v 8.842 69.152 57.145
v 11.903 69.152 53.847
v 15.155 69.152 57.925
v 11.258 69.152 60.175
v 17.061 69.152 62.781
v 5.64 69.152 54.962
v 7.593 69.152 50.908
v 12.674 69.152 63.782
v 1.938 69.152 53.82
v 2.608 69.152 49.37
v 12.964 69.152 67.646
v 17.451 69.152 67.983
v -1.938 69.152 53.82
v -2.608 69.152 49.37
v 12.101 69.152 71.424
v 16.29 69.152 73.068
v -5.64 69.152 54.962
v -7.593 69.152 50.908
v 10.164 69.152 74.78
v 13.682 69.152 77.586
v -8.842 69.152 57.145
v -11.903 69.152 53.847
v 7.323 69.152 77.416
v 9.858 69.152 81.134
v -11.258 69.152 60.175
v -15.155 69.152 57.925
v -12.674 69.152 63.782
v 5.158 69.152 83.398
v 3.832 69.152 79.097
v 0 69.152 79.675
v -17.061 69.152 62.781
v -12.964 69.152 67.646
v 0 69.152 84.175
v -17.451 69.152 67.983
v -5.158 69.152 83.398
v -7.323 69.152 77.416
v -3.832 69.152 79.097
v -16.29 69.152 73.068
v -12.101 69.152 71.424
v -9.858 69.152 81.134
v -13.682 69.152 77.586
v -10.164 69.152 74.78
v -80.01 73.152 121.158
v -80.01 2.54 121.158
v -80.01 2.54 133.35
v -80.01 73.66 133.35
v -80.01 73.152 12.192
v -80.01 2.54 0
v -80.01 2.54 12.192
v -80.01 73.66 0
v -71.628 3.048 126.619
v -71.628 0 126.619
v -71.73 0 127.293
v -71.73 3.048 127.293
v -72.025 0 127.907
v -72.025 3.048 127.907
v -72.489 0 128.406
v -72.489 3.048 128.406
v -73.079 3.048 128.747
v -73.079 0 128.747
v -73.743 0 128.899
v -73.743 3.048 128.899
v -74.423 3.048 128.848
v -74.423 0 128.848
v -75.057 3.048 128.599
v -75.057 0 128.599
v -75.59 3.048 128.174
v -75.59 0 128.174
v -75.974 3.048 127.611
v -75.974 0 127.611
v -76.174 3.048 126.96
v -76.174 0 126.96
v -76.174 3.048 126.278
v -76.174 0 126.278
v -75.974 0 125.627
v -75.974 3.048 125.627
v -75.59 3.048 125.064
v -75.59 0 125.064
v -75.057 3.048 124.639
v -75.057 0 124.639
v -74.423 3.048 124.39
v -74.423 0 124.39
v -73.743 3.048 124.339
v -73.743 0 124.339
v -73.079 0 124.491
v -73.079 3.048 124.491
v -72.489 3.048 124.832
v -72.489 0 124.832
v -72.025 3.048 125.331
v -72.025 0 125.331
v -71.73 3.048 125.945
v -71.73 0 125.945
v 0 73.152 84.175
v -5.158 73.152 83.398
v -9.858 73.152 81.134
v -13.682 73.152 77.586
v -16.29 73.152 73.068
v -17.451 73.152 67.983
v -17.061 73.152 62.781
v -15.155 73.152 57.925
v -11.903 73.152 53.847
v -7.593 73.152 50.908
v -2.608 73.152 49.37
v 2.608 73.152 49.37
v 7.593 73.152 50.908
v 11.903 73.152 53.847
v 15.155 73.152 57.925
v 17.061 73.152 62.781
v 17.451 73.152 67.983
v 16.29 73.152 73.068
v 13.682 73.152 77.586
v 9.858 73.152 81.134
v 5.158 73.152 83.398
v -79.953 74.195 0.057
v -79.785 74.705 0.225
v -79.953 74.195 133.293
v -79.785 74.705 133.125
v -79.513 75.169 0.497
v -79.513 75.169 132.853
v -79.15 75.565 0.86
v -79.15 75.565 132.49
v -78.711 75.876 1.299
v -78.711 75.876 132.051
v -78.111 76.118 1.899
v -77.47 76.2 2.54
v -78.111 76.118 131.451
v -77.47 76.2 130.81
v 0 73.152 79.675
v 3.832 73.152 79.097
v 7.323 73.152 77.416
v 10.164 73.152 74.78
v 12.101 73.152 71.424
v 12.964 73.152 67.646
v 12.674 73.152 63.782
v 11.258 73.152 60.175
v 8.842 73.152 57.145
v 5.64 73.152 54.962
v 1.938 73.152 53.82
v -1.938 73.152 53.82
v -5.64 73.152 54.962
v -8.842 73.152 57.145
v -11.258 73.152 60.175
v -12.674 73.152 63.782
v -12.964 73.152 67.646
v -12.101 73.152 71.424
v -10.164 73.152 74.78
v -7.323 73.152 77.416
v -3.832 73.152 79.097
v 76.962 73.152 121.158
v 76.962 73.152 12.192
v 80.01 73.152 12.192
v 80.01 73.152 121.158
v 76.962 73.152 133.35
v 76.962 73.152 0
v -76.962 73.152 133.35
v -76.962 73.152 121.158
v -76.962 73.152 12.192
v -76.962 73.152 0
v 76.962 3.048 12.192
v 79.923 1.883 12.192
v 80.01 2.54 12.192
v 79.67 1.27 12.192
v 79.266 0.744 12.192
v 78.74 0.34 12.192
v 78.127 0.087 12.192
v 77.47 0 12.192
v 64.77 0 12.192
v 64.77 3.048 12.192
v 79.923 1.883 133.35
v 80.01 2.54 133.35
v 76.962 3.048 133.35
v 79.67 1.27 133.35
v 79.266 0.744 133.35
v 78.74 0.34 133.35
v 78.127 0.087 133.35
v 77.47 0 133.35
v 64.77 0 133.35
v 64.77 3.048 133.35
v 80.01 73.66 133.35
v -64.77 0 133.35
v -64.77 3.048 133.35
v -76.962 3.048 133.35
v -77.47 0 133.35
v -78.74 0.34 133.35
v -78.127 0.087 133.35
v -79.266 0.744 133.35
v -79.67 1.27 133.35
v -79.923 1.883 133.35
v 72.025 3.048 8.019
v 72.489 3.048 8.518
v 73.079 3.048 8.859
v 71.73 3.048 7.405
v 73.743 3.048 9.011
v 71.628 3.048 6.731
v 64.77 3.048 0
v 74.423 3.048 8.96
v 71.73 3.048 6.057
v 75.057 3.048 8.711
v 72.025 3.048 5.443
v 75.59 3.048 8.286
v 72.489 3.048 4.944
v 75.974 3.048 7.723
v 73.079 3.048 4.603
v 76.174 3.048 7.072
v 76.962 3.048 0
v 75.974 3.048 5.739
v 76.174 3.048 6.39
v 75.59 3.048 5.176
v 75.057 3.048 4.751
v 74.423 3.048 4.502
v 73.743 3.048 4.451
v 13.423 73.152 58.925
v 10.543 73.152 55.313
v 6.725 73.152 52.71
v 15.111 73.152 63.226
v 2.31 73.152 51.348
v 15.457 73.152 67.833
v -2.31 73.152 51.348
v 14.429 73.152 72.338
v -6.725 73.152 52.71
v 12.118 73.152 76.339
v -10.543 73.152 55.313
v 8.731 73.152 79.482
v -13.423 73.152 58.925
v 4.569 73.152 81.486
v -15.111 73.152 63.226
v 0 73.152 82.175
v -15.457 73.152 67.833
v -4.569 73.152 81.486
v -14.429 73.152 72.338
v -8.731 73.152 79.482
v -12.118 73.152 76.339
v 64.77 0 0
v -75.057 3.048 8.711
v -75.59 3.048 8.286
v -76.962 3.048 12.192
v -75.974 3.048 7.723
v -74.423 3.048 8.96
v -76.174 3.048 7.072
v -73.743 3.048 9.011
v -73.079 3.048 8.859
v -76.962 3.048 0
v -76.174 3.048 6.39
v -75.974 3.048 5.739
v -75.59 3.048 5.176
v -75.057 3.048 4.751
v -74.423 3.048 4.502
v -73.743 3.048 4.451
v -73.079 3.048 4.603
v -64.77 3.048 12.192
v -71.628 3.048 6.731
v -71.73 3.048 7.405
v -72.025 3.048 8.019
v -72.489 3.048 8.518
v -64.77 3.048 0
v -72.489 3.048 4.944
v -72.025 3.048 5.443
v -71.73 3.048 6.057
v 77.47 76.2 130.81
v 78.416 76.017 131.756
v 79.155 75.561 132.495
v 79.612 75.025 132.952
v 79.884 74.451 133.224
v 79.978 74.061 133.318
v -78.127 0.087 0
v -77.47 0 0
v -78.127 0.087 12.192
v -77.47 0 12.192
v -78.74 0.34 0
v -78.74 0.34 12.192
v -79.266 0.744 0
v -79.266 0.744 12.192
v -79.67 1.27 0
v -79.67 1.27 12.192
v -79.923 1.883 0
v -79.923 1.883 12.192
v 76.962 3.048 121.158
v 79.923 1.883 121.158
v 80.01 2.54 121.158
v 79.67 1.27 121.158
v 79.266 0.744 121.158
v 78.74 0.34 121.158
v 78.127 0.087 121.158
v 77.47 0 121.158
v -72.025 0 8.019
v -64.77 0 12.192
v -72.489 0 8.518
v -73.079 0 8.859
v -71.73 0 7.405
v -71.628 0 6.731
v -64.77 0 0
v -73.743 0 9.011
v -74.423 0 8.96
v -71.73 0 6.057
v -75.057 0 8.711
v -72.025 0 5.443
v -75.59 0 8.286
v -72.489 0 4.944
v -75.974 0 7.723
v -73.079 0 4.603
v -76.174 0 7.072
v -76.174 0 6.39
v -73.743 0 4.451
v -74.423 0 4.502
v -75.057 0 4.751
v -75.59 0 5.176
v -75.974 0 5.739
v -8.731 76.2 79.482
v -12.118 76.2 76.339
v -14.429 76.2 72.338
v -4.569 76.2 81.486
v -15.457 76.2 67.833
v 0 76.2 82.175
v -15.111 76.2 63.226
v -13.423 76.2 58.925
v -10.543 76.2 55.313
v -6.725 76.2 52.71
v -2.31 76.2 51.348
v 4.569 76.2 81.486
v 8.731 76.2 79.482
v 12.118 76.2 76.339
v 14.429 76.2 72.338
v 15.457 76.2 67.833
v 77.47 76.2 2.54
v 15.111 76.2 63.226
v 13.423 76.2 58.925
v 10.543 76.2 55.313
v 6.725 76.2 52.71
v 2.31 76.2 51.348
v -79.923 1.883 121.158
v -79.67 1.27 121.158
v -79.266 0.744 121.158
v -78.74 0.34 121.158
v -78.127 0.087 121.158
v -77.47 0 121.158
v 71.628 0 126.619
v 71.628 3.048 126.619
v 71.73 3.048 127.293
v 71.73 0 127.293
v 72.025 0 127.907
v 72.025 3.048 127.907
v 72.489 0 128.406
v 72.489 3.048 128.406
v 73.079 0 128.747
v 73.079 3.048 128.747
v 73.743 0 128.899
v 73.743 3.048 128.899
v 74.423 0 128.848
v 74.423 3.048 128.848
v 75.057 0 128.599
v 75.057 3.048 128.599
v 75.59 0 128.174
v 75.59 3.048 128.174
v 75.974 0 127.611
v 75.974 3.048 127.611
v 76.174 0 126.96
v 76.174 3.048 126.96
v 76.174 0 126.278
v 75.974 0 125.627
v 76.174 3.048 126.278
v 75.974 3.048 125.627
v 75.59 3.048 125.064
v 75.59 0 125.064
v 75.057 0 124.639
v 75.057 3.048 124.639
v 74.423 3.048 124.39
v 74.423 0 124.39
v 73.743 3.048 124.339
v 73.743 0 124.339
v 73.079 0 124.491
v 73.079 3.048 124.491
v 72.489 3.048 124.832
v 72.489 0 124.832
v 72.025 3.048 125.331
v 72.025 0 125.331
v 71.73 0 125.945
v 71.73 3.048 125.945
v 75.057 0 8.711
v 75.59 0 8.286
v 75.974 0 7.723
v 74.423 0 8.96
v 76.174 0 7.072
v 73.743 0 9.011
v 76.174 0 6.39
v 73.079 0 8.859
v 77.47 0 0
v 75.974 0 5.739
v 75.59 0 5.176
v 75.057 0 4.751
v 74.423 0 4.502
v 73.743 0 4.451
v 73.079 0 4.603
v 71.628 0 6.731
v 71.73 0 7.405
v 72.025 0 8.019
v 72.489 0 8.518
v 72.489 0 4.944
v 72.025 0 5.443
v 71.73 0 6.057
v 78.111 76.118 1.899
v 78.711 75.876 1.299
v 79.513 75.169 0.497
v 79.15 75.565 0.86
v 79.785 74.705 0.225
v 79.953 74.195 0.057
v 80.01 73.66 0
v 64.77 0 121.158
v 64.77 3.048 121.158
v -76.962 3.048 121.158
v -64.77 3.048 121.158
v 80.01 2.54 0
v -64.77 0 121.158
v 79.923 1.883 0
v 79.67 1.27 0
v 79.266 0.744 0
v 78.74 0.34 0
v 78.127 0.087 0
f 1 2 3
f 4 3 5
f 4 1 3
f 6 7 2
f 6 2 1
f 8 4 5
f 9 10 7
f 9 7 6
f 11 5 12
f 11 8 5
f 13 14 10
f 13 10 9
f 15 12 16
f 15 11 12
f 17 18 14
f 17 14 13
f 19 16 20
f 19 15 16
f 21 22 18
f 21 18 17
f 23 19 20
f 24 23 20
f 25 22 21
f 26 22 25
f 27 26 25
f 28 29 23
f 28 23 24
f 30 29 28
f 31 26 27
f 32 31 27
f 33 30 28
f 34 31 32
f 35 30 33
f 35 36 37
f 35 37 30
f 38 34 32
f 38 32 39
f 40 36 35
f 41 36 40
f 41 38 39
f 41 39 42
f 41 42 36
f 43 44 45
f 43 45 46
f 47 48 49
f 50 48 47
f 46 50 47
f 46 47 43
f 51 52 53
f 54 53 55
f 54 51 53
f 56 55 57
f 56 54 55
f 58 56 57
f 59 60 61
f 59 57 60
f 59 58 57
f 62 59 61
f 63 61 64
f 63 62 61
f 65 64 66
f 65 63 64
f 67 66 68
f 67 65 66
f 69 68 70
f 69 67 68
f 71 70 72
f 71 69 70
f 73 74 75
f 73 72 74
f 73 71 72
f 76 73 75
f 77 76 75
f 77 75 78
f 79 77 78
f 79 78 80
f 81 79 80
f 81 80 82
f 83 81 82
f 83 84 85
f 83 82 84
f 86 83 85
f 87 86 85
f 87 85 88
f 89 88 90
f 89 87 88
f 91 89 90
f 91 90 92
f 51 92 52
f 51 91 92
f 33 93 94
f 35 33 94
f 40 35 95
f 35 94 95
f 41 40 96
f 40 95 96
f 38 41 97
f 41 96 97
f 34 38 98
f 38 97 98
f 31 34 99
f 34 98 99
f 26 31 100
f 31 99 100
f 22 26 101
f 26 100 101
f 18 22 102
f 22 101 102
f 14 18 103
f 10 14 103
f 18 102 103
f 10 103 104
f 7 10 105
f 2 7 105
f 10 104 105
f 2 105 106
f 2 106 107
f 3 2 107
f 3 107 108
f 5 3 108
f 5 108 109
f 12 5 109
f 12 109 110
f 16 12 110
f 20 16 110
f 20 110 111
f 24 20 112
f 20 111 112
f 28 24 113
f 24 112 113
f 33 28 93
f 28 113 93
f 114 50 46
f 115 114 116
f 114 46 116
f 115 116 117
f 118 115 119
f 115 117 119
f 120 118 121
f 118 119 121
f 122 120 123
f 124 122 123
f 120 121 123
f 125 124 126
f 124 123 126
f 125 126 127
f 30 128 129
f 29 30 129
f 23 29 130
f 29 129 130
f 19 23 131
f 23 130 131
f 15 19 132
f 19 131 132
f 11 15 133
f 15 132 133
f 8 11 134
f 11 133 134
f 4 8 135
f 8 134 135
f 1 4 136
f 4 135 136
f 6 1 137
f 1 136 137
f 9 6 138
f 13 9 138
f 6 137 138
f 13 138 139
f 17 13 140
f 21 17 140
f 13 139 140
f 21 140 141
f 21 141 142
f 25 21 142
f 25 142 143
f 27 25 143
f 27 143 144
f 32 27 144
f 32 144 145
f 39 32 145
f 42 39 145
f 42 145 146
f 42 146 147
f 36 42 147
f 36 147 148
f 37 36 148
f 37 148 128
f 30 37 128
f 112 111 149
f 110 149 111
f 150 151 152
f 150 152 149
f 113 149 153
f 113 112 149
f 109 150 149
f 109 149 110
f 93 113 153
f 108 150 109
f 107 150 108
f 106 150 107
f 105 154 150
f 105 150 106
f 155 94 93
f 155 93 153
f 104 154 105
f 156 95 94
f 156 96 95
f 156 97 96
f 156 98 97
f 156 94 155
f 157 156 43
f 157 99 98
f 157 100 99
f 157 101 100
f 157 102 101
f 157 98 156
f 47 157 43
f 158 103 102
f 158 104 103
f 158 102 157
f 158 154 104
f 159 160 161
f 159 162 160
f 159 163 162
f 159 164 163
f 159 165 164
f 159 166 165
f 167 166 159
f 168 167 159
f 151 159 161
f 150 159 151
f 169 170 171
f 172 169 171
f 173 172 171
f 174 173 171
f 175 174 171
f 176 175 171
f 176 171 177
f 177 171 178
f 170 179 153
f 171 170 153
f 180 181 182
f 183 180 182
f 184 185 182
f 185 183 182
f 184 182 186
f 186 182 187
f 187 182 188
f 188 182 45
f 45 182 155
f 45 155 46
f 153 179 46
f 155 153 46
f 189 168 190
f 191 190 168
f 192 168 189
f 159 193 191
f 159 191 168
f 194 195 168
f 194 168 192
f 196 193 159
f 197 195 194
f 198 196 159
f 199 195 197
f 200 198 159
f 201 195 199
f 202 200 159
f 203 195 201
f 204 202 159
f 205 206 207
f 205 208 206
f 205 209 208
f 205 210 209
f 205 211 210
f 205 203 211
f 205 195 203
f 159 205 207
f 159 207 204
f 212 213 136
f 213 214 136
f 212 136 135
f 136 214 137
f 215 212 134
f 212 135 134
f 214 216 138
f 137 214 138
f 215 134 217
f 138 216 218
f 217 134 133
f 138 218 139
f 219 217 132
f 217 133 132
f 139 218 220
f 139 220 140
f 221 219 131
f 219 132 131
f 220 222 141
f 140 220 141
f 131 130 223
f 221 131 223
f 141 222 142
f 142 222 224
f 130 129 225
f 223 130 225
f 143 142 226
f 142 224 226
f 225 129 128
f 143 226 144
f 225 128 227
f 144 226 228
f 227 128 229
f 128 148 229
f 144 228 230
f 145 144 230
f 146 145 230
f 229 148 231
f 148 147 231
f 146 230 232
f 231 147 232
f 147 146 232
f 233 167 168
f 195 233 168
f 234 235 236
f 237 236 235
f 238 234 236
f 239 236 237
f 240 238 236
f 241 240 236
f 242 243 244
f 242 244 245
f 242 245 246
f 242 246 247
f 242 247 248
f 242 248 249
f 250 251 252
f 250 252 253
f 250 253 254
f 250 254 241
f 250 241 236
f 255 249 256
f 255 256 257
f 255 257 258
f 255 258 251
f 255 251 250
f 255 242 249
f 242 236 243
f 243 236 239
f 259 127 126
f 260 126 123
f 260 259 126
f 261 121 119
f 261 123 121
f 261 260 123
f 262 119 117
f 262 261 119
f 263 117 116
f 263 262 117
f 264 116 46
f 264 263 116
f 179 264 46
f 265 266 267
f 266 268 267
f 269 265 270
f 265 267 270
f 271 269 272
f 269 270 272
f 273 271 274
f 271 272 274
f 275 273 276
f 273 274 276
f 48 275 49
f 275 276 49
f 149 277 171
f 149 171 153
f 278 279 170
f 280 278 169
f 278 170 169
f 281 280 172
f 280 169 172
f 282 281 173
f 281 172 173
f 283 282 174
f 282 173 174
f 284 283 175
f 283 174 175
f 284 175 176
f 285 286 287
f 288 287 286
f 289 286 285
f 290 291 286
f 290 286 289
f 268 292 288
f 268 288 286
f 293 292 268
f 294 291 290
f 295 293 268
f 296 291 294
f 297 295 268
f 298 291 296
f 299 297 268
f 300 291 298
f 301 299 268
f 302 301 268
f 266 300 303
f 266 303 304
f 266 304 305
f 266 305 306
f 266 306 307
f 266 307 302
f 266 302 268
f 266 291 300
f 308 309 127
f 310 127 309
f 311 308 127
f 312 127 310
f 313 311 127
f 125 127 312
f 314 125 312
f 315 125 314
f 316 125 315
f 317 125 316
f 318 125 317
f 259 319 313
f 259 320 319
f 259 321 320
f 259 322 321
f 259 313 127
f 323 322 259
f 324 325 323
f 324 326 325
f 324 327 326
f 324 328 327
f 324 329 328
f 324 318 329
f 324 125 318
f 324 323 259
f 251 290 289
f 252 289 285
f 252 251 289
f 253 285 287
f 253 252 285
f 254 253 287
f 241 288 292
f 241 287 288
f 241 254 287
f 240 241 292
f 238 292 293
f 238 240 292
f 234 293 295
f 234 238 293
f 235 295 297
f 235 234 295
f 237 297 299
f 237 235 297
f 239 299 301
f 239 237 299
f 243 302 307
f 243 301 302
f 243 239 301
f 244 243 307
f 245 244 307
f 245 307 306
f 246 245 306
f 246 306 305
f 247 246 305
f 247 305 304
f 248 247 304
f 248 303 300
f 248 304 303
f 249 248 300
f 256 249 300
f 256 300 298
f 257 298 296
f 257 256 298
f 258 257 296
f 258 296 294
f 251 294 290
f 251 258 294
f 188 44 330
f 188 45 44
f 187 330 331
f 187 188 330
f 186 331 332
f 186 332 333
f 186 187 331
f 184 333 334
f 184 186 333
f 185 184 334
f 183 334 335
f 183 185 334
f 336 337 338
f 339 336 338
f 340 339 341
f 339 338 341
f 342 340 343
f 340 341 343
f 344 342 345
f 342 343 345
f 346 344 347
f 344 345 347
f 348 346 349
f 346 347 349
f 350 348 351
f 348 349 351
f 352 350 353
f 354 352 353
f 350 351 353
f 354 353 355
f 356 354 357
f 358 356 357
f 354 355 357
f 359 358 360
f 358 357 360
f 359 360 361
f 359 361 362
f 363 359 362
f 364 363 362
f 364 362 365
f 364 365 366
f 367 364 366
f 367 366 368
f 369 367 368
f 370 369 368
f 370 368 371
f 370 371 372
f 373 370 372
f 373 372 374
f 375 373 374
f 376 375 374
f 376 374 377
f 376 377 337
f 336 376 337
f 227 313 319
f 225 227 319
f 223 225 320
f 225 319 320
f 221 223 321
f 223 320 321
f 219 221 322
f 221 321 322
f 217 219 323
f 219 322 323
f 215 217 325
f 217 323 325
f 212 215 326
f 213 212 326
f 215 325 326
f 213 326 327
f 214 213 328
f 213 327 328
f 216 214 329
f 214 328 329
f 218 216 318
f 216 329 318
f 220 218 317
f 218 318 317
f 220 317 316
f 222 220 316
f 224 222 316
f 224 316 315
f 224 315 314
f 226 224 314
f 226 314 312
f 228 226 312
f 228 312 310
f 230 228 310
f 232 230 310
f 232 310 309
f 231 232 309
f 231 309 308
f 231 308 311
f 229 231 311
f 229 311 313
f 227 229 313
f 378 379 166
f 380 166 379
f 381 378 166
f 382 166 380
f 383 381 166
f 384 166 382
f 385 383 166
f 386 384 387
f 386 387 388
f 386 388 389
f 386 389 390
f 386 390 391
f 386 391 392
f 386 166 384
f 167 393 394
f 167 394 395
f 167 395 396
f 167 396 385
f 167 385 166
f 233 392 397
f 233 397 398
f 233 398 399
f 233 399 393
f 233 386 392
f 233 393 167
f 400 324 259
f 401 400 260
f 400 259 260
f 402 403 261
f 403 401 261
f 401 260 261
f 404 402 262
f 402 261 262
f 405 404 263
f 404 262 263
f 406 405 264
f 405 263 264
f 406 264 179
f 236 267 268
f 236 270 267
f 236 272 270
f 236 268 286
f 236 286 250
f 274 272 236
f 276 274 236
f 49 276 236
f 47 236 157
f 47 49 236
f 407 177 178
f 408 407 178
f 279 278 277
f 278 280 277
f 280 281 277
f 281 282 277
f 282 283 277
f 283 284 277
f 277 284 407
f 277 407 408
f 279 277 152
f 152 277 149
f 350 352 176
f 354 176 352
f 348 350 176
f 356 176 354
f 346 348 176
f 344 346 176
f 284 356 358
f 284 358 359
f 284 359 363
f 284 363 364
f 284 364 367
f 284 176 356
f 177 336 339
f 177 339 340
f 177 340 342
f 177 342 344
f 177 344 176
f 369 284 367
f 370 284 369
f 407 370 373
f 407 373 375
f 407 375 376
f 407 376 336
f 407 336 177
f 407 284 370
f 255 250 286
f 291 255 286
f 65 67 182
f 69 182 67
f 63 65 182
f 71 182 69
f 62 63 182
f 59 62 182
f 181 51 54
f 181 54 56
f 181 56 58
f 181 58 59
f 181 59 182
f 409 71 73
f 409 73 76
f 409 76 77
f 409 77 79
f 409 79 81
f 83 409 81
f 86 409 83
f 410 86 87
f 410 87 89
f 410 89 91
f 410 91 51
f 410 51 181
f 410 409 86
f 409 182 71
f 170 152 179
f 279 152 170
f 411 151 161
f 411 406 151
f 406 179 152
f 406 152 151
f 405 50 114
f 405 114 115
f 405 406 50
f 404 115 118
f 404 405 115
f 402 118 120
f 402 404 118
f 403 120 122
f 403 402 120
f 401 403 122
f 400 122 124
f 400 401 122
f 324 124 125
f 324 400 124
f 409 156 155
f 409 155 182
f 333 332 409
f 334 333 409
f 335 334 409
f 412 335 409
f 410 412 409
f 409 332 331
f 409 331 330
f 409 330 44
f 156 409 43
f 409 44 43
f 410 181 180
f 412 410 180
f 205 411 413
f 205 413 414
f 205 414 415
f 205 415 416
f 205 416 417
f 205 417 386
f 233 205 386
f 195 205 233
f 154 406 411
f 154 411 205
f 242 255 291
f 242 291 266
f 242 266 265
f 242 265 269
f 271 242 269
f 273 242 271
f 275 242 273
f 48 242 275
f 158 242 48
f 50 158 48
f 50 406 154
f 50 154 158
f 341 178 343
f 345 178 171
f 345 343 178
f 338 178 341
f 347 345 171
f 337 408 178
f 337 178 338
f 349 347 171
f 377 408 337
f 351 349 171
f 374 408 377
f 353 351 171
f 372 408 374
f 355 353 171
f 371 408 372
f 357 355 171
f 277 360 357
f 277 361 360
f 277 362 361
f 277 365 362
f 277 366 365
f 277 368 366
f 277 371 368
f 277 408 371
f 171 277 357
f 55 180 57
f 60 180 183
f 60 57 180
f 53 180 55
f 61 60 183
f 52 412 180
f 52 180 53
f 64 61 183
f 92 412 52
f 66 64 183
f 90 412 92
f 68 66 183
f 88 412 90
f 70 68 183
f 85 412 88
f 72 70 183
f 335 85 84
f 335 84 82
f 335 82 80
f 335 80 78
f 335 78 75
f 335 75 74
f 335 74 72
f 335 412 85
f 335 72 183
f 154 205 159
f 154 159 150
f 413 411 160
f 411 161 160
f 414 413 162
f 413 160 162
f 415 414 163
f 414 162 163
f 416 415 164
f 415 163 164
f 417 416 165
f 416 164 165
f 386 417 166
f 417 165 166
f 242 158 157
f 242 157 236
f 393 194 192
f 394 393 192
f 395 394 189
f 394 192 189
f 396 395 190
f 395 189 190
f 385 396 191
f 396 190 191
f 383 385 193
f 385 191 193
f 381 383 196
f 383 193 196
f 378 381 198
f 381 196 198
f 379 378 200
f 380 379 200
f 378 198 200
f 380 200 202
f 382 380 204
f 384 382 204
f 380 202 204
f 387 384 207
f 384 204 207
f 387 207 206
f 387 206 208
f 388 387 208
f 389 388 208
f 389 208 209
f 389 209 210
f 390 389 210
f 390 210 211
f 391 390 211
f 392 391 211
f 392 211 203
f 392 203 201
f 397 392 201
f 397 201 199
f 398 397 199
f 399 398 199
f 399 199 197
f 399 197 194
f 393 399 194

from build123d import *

# Parameters (mm, degrees)
BOSS_EXTRU_1_DEPTH      = 133.35
ESQUISSE3_W             = 108.966
ESQUISSE3_H             = 73.152
ENL_V_MAT_EXTRU_1_DEPTH = 222.799600766
ESQUISSE4_R             = 2.286
ENL_V_MAT_EXTRU_2_DEPTH = 172.857608804
CONG_1_R                = 2.54
CONG_2_R                = 2.54
ESQUISSE5_R             = 2.286
ENL_V_MAT_EXTRU_3_DEPTH = 172.857608804
ESQUISSE6_R             = 15.5
ENL_V_MAT_EXTRU_4_DEPTH = 174.176969023
SKETCH1_R               = 17.5
BOSS_EXTRUDE1_DEPTH     = 4
SKETCH2_R               = 13
CUT_EXTRUDE1_DEPTH      = 172.857608804


with BuildPart() as part:
    # Esquisse2 → Boss.-Extru.1 (new body)
    with BuildSketch(Plane.XY):
        Polygon((-64.77, 0), (-80.01, 0), (-80.01, 76.2), (80.01, 76.2), (80.01, 0), (64.77, 0), (64.77, 3.048), (76.962, 3.048), (76.962, 73.152), (-76.962, 73.152), (-76.962, 3.048), (-64.77, 3.048), align=None)
    extrude(amount=BOSS_EXTRU_1_DEPTH)

    # Esquisse3 → Enlèv. mat.-Extru.1 (cut, through all)
    with BuildSketch(Plane.ZY.offset(80.01)):
        with Locations((66.675, 36.576)):
            Rectangle(ESQUISSE3_W, ESQUISSE3_H)
    extrude(amount=-ENL_V_MAT_EXTRU_1_DEPTH, mode=Mode.SUBTRACT)

    # Esquisse4 → Enlèv. mat.-Extru.2 (cut, through all)
    with BuildSketch(Plane(origin=(0, 3.048, 0), x_dir=(1, 0, 0), z_dir=(0, 1, 0))):
        with Locations(Location((73.914, -6.731, 0), (0, 0, 180))):
            Circle(ESQUISSE4_R)
    enl_v_mat_extru_2 = extrude(amount=-ENL_V_MAT_EXTRU_2_DEPTH, mode=Mode.SUBTRACT)

    # Congé1
    cong_1_edges = [part.edges().sort_by_distance(p)[0] for p in [
        (-80.01, 0, 127.254),
        (80.01, 0, 127.254),
        (-80.01, 0, 6.096),
        (80.01, 0, 6.096),
    ]]
    fillet(cong_1_edges, radius=CONG_1_R)

    # Congé2
    cong_2_edges = [part.edges().sort_by_distance(p)[0] for p in [
        (0, 76.2, 0),
        (-80.01, 76.2, 66.675),
        (80.01, 76.2, 66.675),
        (0, 76.2, 133.35),
    ]]
    fillet(cong_2_edges, radius=CONG_2_R)

    # Esquisse5 → Enlèv. mat.-Extru.3 (cut, through all)
    with BuildSketch(Plane(origin=(0, 3.048, 0), x_dir=(1, 0, 0), z_dir=(0, 1, 0))):
        with Locations(Location((73.914, -126.619, 0), (0, 0, 180))):
            Circle(ESQUISSE5_R)
    enl_v_mat_extru_3 = extrude(amount=-ENL_V_MAT_EXTRU_3_DEPTH, mode=Mode.SUBTRACT)

    # Esquisse6 → Enlèv. mat.-Extru.4 (cut, through all)
    with BuildSketch(Plane(origin=(0, 76.2, 0), x_dir=(1, 0, 0), z_dir=(0, 1, 0))):
        with Locations(Location((0, -66.675, 0), (0, 0, 270))):
            Circle(ESQUISSE6_R)
    extrude(amount=-ENL_V_MAT_EXTRU_4_DEPTH, mode=Mode.SUBTRACT)

    # Symétrie1: Enlèv. mat.-Extru.3 across plane
    add(enl_v_mat_extru_3.mirror(Plane(origin=(0, 0, 0), x_dir=(0, 0, 1), z_dir=(1, 0, 0))), mode=Mode.SUBTRACT)

    # Symétrie2: Enlèv. mat.-Extru.2 across plane
    add(enl_v_mat_extru_2.mirror(Plane(origin=(0, 0, 0), x_dir=(0, 0, 1), z_dir=(1, 0, 0))), mode=Mode.SUBTRACT)

    # Sketch1 → Boss-Extrude1 (add)
    with BuildSketch(Plane.XZ.offset(-73.152)):
        with Locations(Location((0, 66.675, 0), (0, 0, 90))):
            Circle(SKETCH1_R)
    extrude(amount=BOSS_EXTRUDE1_DEPTH)

    # Sketch2 → Cut-Extrude1 (cut, through all)
    with BuildSketch(Plane(origin=(0, 73.152, 0), x_dir=(1, 0, 0), z_dir=(0, 1, 0))):
        with Locations(Location((0, -66.675, 0), (0, 0, 270))):
            Circle(SKETCH2_R)
    extrude(amount=-CUT_EXTRUDE1_DEPTH, mode=Mode.SUBTRACT)


solid = part.part
